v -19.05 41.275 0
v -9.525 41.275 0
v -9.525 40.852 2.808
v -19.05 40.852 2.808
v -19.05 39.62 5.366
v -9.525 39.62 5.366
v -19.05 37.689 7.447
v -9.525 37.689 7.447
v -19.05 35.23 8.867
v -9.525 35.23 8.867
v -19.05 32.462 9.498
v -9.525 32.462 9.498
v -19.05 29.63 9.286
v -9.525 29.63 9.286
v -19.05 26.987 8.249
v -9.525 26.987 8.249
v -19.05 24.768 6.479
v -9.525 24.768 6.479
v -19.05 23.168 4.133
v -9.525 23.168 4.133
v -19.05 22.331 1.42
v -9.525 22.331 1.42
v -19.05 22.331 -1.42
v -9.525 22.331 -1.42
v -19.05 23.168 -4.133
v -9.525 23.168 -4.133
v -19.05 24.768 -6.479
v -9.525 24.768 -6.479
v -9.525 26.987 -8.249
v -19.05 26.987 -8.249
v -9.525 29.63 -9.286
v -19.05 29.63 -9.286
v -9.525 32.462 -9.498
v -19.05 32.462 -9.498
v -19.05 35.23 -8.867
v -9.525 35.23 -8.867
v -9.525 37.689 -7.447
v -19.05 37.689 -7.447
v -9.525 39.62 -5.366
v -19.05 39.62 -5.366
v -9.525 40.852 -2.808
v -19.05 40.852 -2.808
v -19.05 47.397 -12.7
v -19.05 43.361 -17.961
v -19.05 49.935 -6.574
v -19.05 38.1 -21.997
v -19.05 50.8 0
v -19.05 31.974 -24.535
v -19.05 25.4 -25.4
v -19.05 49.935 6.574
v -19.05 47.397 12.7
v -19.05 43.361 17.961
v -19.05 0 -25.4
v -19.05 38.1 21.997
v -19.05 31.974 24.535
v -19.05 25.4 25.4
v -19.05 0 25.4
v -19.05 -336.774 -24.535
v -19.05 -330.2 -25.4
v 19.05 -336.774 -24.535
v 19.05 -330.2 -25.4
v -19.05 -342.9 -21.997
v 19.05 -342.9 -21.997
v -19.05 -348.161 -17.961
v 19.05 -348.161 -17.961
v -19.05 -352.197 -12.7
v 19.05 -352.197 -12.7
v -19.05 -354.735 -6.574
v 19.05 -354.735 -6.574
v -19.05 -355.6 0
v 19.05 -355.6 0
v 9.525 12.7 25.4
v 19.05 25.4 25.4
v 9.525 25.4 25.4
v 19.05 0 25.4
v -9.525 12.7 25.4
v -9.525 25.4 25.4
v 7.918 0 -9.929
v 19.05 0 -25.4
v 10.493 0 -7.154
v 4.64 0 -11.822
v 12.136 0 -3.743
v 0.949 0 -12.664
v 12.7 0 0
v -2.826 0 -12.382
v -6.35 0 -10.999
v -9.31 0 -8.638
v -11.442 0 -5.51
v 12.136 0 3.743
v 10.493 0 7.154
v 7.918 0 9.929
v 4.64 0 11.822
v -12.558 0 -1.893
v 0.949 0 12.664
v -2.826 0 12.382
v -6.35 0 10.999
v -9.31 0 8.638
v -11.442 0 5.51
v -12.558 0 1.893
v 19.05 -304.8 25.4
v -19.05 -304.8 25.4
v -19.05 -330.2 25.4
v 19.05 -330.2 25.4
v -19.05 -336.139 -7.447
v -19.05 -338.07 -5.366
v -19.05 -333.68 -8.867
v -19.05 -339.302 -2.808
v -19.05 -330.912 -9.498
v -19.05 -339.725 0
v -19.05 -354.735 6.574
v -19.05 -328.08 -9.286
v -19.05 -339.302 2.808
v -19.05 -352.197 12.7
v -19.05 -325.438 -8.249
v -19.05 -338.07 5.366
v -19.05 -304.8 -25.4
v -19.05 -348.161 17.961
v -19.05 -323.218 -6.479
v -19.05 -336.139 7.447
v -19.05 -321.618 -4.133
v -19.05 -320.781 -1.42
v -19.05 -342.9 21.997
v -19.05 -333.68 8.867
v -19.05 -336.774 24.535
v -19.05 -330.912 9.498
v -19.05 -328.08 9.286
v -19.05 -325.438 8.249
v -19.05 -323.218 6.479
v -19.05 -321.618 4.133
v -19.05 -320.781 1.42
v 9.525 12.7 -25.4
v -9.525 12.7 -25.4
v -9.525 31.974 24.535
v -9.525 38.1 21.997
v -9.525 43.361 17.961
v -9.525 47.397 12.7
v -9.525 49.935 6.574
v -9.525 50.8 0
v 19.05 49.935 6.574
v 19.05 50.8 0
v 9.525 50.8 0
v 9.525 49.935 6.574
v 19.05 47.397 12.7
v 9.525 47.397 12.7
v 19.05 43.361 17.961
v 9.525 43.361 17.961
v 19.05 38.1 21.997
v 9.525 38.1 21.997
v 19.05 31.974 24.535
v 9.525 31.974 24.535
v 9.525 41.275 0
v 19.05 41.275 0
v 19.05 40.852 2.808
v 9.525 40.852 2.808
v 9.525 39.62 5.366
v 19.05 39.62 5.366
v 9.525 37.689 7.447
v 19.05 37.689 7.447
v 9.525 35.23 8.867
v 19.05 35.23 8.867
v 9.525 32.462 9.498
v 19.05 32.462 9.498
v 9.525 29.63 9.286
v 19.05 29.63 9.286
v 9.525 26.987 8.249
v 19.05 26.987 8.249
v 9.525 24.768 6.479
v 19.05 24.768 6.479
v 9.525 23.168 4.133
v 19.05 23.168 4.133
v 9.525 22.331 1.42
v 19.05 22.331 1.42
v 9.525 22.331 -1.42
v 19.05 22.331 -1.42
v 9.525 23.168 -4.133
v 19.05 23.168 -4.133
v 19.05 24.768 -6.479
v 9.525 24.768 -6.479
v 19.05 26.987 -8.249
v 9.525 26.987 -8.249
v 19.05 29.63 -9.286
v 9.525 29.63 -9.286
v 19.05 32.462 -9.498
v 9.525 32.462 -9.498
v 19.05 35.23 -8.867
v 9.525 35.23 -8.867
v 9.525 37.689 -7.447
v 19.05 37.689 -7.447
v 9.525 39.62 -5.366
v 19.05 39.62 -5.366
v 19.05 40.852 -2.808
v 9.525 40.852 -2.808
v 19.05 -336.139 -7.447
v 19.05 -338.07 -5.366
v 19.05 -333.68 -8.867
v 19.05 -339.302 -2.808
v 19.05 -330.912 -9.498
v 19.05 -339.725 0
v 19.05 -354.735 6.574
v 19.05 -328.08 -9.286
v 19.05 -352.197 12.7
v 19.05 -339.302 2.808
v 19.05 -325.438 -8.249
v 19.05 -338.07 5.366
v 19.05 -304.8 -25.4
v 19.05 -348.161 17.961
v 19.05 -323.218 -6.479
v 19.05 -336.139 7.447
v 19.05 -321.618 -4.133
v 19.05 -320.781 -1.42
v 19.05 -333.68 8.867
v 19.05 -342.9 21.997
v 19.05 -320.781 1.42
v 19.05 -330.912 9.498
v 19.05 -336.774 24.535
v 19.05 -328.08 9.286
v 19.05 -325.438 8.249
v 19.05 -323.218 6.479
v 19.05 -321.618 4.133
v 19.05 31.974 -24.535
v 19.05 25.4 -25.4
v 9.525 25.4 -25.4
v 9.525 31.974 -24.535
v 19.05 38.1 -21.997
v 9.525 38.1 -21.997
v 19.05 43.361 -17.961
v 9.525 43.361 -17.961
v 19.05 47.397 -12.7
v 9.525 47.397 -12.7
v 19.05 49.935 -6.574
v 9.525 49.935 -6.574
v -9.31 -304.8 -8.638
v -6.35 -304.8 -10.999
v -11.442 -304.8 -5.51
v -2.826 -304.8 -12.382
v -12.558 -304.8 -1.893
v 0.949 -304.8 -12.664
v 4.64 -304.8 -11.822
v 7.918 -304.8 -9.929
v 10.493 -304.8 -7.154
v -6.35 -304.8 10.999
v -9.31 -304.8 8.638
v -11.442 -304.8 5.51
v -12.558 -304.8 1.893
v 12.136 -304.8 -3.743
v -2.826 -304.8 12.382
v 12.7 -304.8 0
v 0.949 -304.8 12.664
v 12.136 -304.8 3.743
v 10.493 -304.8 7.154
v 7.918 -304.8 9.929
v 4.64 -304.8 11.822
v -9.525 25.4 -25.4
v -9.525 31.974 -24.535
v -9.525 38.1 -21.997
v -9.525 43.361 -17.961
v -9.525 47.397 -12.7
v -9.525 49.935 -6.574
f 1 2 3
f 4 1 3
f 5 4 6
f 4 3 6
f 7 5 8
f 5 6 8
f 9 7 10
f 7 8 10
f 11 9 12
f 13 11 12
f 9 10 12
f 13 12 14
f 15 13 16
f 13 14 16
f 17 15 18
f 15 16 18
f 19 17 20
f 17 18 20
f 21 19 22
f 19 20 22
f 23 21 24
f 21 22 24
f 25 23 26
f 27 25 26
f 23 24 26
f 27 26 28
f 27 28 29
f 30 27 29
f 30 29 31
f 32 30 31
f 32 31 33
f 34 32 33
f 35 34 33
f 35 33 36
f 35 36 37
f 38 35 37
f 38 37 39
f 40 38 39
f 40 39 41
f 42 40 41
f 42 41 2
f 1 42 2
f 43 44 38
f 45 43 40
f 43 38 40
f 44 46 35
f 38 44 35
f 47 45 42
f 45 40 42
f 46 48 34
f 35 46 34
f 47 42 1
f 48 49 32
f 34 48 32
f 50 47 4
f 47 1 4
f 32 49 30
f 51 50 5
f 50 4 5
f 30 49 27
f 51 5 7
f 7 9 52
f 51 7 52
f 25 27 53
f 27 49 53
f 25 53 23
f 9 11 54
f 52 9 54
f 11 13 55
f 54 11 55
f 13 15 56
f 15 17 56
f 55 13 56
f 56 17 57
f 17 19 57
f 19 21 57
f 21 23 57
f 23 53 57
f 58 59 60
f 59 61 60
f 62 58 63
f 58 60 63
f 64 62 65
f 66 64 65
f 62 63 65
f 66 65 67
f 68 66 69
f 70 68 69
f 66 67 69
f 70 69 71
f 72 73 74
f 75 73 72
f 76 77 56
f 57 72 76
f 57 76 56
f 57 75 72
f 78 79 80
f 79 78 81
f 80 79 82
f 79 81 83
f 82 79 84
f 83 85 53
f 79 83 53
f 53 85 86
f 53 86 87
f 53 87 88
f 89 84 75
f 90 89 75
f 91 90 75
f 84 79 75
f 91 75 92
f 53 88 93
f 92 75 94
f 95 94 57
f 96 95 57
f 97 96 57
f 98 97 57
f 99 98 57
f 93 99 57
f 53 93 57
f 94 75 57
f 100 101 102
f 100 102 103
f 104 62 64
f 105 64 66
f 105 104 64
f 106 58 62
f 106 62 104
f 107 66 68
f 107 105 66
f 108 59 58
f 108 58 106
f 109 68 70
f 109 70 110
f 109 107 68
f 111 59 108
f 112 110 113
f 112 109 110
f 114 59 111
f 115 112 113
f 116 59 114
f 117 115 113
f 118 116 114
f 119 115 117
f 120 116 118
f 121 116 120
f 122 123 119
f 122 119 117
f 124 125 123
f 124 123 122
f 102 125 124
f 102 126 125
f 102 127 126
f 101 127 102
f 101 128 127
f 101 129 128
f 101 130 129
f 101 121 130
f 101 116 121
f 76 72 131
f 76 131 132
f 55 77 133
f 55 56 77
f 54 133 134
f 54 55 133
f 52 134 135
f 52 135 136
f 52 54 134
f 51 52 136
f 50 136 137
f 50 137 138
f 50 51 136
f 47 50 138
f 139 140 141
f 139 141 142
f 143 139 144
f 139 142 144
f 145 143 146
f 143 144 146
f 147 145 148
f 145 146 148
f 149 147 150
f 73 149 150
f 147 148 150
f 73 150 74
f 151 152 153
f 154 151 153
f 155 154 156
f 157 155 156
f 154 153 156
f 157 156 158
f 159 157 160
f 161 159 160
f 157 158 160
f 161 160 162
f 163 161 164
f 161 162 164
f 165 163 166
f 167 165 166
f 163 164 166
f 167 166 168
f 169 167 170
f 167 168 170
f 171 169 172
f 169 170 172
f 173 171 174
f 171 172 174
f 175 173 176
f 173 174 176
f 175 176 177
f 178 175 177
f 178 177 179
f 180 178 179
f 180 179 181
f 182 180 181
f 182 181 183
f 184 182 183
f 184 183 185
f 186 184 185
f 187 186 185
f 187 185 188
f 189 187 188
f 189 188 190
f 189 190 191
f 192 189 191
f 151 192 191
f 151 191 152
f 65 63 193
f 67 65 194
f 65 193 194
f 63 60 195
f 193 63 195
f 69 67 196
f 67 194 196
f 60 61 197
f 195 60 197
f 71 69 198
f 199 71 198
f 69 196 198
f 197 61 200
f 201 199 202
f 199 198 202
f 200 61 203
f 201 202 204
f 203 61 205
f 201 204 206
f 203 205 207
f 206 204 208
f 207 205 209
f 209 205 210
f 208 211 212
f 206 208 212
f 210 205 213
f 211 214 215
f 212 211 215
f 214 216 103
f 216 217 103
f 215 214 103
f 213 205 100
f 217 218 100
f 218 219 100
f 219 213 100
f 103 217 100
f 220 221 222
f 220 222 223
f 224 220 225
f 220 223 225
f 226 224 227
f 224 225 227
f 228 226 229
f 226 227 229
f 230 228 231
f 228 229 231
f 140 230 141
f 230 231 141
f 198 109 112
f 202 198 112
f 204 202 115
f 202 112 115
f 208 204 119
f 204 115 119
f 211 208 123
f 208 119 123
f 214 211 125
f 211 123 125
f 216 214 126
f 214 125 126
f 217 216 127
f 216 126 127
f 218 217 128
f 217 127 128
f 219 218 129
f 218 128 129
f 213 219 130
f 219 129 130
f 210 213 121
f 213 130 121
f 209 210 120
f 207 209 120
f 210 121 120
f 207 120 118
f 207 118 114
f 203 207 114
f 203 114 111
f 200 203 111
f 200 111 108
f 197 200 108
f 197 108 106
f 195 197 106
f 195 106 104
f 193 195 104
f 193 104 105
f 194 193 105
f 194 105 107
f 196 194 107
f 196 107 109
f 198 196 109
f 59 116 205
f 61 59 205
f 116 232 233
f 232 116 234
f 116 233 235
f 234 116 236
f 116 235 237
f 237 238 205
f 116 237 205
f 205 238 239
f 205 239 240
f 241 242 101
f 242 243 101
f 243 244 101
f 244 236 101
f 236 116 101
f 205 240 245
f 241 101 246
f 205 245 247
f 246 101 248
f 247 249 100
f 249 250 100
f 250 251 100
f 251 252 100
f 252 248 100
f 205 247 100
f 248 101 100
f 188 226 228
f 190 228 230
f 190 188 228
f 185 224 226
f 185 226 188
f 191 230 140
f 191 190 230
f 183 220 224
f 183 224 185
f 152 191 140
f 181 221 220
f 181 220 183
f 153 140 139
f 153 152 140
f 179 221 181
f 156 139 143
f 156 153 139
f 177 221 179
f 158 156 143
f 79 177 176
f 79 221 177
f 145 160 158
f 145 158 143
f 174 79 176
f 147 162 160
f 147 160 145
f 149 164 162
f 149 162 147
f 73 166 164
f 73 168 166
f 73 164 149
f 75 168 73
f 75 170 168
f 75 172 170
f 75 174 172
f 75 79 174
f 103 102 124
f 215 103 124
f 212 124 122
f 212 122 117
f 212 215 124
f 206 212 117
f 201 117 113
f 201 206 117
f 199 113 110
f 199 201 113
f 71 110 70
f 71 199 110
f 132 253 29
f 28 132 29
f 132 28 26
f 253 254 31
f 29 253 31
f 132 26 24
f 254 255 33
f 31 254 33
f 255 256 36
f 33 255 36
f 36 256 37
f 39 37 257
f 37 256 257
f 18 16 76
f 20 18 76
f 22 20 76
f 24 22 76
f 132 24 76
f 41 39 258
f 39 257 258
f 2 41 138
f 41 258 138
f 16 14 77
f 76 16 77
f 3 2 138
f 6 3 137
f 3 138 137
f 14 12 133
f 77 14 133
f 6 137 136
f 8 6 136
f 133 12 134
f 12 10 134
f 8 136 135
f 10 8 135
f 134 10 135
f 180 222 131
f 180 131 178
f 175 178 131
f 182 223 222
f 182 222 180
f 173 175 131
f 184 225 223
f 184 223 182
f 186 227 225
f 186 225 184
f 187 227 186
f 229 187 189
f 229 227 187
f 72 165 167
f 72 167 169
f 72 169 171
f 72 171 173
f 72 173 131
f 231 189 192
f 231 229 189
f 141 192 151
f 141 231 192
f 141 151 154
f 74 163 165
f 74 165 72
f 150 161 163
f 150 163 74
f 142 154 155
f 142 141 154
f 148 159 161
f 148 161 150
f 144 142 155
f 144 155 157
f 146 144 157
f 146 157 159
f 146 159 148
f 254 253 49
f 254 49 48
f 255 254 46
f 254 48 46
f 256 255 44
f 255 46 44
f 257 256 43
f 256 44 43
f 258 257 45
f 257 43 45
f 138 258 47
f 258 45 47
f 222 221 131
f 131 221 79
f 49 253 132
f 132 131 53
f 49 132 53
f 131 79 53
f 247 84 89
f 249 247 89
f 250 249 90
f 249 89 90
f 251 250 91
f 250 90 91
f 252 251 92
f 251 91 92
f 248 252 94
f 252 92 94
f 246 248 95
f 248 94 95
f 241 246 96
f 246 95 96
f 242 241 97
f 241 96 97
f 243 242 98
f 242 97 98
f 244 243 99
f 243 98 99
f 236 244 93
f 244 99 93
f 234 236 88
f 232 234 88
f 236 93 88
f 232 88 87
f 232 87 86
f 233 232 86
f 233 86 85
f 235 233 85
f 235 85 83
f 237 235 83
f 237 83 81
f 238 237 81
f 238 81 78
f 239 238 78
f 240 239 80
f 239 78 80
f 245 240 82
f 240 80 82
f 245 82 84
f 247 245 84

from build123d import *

# Parameters (mm, degrees)
F0_R      = 12.7
F1_DEPTH  = 304.8
F2_W      = 38.1
F2_H      = 50.8
F3_DEPTH  = 50.8
F4_R      = 9.525
F5_DEPTH  = 38.101
F6_W      = 38.1
F6_H      = 50.8
F7_DEPTH  = 50.8
F8_W      = 19.05
F8_H      = 50.8
F9_DEPTH  = 38.1
F10_R     = 9.525
F11_DEPTH = 38.101
F12_R     = 25.39999


# Not quite as in the source:
# - a fillet or chamfer is up to 0.001 mm smaller than in the source, because OpenCascade refuses the exact size


with BuildPart() as f1:
    # F0 (on Front) → F1 (new body)
    with BuildSketch(Plane.XZ):
        Circle(F0_R)
    extrude(amount=F1_DEPTH)

    # F2 (on face) → F3 (join)
    with BuildSketch(Plane.XZ.offset(304.8)):
        Rectangle(F2_W, F2_H)
    extrude(amount=F3_DEPTH)

    # F4 (on face) → F5 (cut, through all)
    with BuildSketch(Plane(origin=(-19.05, 0, 0), x_dir=(0, -1, 0), z_dir=(-1, 0, 0))):
        with Locations((330.2, 0)):
            Circle(F4_R)
    extrude(amount=-F5_DEPTH, mode=Mode.SUBTRACT)

    # F6 (on face) → F7 (join)
    with BuildSketch(Plane(origin=(0, 0, 0), x_dir=(-1, 0, 0), z_dir=(0, 1, 0))):
        Rectangle(F6_W, F6_H)
    extrude(amount=F7_DEPTH)

    # F8 (on face) → F9 (cut)
    with BuildSketch(Plane(origin=(0, 50.8, 0), x_dir=(-1, 0, 0), z_dir=(0, 1, 0))):
        Rectangle(F8_W, F8_H)
    extrude(amount=-F9_DEPTH, mode=Mode.SUBTRACT)

    # F10 (on face) → F11 (cut, through all)
    with BuildSketch(Plane.YZ.offset(19.05)):
        with Locations((31.75, 0)):
            Circle(F10_R)
    extrude(amount=-F11_DEPTH, mode=Mode.SUBTRACT)

    # F12 (radius 25.4 in the source; OpenCascade refuses exactly that, so slightly less here)
    f12_edges = [f1.edges().sort_by_distance(p)[0] for p in [
        (14.2875, 50.8, 25.4),
        (14.2875, 50.8, -25.4),
        (-14.2875, 50.8, -25.4),
        (-14.2875, 50.8, 25.4),
        (0, -355.6, 25.4),
        (0, -355.6, -25.4),
    ]]
    fillet(f12_edges, radius=F12_R)


solid = f1.part
